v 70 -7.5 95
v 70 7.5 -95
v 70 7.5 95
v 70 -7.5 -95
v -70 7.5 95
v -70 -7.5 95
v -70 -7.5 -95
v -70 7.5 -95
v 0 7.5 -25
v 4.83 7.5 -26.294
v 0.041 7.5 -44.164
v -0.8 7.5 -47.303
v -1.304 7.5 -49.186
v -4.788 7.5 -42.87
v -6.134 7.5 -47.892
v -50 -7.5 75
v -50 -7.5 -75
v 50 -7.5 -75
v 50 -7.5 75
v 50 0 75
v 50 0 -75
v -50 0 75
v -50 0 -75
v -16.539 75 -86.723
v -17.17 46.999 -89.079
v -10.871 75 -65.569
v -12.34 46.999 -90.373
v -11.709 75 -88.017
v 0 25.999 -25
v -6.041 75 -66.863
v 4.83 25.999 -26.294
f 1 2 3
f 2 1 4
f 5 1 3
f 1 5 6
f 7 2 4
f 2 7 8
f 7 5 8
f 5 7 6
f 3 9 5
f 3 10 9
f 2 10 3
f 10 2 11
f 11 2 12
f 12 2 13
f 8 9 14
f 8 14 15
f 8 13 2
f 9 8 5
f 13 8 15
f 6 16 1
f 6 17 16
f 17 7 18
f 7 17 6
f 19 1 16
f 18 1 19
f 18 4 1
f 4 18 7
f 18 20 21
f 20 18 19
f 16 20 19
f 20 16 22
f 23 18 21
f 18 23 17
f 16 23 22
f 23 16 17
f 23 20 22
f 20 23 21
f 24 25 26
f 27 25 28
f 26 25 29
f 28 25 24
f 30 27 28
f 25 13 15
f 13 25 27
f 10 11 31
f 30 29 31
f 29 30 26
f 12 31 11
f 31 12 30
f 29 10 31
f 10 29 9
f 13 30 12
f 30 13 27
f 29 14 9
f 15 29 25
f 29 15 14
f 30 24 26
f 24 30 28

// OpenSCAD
/**
 *
 * @licstart
 *
 * Copyright (C) 2017  AlephObjects, Inc.
 *
 *
 * The JavaScript code in this page is free software: you can
 * redistribute it and/or modify it under the terms of the GNU
 * General Public License (GNU GPL) as published by the Free Software
 * Foundation, either version 3 of the License, or (at your option)
 * any later version.  The code is distributed WITHOUT ANY WARRANTY;
 * without even the implied warranty of MERCHANTABILITY or FITNESS
 * FOR A PARTICULAR PURPOSE.  See the GNU GPL for more details.
 *
 * As additional permission under GNU GPL version 3 section 7, you
 * may distribute non-source (e.g., minimized or compacted) forms of
 * that code without the copy of the GNU GPL normally required by
 * section 4, provided you include this license notice and a URL
 * through which recipients can access the Corresponding Source.
 *
 * @licend
 *
 */

picture_width  = 100;
picture_height = 150;
frame_depth    = 15;
frame_border   = 20;

frame_width    = picture_width+frame_border*2;
frame_height   = picture_height+frame_border*2;

module frame() {
	difference() {
		cube([frame_width,frame_depth,frame_height],center=true);

		translate([0,-frame_depth/2,0])
			cube([picture_width,frame_depth,picture_height],center=true);
	}
}

module stand_profile() {
	a = sin(5);
	scale([frame_width/2,frame_width/2])
	polygon(points=[
		[0.0,1.0],
		[0.3,1.0],
		[1.0,0.4],
		[1.0,0.0+a*1.0],
		[0.6,0.0+a*0.6],
		[0.0,0.7]
	]);
}

module stand() {
	a = 0.1;
	rotate([90,0,90])
	linear_extrude(5)
	translate([0,-frame_width/2,0])
	scale([1,1,1])
	stand_profile();
}

frame();

translate([0,5,-(frame_height-frame_width)/2])
	rotate([0,15,0])
	stand();
